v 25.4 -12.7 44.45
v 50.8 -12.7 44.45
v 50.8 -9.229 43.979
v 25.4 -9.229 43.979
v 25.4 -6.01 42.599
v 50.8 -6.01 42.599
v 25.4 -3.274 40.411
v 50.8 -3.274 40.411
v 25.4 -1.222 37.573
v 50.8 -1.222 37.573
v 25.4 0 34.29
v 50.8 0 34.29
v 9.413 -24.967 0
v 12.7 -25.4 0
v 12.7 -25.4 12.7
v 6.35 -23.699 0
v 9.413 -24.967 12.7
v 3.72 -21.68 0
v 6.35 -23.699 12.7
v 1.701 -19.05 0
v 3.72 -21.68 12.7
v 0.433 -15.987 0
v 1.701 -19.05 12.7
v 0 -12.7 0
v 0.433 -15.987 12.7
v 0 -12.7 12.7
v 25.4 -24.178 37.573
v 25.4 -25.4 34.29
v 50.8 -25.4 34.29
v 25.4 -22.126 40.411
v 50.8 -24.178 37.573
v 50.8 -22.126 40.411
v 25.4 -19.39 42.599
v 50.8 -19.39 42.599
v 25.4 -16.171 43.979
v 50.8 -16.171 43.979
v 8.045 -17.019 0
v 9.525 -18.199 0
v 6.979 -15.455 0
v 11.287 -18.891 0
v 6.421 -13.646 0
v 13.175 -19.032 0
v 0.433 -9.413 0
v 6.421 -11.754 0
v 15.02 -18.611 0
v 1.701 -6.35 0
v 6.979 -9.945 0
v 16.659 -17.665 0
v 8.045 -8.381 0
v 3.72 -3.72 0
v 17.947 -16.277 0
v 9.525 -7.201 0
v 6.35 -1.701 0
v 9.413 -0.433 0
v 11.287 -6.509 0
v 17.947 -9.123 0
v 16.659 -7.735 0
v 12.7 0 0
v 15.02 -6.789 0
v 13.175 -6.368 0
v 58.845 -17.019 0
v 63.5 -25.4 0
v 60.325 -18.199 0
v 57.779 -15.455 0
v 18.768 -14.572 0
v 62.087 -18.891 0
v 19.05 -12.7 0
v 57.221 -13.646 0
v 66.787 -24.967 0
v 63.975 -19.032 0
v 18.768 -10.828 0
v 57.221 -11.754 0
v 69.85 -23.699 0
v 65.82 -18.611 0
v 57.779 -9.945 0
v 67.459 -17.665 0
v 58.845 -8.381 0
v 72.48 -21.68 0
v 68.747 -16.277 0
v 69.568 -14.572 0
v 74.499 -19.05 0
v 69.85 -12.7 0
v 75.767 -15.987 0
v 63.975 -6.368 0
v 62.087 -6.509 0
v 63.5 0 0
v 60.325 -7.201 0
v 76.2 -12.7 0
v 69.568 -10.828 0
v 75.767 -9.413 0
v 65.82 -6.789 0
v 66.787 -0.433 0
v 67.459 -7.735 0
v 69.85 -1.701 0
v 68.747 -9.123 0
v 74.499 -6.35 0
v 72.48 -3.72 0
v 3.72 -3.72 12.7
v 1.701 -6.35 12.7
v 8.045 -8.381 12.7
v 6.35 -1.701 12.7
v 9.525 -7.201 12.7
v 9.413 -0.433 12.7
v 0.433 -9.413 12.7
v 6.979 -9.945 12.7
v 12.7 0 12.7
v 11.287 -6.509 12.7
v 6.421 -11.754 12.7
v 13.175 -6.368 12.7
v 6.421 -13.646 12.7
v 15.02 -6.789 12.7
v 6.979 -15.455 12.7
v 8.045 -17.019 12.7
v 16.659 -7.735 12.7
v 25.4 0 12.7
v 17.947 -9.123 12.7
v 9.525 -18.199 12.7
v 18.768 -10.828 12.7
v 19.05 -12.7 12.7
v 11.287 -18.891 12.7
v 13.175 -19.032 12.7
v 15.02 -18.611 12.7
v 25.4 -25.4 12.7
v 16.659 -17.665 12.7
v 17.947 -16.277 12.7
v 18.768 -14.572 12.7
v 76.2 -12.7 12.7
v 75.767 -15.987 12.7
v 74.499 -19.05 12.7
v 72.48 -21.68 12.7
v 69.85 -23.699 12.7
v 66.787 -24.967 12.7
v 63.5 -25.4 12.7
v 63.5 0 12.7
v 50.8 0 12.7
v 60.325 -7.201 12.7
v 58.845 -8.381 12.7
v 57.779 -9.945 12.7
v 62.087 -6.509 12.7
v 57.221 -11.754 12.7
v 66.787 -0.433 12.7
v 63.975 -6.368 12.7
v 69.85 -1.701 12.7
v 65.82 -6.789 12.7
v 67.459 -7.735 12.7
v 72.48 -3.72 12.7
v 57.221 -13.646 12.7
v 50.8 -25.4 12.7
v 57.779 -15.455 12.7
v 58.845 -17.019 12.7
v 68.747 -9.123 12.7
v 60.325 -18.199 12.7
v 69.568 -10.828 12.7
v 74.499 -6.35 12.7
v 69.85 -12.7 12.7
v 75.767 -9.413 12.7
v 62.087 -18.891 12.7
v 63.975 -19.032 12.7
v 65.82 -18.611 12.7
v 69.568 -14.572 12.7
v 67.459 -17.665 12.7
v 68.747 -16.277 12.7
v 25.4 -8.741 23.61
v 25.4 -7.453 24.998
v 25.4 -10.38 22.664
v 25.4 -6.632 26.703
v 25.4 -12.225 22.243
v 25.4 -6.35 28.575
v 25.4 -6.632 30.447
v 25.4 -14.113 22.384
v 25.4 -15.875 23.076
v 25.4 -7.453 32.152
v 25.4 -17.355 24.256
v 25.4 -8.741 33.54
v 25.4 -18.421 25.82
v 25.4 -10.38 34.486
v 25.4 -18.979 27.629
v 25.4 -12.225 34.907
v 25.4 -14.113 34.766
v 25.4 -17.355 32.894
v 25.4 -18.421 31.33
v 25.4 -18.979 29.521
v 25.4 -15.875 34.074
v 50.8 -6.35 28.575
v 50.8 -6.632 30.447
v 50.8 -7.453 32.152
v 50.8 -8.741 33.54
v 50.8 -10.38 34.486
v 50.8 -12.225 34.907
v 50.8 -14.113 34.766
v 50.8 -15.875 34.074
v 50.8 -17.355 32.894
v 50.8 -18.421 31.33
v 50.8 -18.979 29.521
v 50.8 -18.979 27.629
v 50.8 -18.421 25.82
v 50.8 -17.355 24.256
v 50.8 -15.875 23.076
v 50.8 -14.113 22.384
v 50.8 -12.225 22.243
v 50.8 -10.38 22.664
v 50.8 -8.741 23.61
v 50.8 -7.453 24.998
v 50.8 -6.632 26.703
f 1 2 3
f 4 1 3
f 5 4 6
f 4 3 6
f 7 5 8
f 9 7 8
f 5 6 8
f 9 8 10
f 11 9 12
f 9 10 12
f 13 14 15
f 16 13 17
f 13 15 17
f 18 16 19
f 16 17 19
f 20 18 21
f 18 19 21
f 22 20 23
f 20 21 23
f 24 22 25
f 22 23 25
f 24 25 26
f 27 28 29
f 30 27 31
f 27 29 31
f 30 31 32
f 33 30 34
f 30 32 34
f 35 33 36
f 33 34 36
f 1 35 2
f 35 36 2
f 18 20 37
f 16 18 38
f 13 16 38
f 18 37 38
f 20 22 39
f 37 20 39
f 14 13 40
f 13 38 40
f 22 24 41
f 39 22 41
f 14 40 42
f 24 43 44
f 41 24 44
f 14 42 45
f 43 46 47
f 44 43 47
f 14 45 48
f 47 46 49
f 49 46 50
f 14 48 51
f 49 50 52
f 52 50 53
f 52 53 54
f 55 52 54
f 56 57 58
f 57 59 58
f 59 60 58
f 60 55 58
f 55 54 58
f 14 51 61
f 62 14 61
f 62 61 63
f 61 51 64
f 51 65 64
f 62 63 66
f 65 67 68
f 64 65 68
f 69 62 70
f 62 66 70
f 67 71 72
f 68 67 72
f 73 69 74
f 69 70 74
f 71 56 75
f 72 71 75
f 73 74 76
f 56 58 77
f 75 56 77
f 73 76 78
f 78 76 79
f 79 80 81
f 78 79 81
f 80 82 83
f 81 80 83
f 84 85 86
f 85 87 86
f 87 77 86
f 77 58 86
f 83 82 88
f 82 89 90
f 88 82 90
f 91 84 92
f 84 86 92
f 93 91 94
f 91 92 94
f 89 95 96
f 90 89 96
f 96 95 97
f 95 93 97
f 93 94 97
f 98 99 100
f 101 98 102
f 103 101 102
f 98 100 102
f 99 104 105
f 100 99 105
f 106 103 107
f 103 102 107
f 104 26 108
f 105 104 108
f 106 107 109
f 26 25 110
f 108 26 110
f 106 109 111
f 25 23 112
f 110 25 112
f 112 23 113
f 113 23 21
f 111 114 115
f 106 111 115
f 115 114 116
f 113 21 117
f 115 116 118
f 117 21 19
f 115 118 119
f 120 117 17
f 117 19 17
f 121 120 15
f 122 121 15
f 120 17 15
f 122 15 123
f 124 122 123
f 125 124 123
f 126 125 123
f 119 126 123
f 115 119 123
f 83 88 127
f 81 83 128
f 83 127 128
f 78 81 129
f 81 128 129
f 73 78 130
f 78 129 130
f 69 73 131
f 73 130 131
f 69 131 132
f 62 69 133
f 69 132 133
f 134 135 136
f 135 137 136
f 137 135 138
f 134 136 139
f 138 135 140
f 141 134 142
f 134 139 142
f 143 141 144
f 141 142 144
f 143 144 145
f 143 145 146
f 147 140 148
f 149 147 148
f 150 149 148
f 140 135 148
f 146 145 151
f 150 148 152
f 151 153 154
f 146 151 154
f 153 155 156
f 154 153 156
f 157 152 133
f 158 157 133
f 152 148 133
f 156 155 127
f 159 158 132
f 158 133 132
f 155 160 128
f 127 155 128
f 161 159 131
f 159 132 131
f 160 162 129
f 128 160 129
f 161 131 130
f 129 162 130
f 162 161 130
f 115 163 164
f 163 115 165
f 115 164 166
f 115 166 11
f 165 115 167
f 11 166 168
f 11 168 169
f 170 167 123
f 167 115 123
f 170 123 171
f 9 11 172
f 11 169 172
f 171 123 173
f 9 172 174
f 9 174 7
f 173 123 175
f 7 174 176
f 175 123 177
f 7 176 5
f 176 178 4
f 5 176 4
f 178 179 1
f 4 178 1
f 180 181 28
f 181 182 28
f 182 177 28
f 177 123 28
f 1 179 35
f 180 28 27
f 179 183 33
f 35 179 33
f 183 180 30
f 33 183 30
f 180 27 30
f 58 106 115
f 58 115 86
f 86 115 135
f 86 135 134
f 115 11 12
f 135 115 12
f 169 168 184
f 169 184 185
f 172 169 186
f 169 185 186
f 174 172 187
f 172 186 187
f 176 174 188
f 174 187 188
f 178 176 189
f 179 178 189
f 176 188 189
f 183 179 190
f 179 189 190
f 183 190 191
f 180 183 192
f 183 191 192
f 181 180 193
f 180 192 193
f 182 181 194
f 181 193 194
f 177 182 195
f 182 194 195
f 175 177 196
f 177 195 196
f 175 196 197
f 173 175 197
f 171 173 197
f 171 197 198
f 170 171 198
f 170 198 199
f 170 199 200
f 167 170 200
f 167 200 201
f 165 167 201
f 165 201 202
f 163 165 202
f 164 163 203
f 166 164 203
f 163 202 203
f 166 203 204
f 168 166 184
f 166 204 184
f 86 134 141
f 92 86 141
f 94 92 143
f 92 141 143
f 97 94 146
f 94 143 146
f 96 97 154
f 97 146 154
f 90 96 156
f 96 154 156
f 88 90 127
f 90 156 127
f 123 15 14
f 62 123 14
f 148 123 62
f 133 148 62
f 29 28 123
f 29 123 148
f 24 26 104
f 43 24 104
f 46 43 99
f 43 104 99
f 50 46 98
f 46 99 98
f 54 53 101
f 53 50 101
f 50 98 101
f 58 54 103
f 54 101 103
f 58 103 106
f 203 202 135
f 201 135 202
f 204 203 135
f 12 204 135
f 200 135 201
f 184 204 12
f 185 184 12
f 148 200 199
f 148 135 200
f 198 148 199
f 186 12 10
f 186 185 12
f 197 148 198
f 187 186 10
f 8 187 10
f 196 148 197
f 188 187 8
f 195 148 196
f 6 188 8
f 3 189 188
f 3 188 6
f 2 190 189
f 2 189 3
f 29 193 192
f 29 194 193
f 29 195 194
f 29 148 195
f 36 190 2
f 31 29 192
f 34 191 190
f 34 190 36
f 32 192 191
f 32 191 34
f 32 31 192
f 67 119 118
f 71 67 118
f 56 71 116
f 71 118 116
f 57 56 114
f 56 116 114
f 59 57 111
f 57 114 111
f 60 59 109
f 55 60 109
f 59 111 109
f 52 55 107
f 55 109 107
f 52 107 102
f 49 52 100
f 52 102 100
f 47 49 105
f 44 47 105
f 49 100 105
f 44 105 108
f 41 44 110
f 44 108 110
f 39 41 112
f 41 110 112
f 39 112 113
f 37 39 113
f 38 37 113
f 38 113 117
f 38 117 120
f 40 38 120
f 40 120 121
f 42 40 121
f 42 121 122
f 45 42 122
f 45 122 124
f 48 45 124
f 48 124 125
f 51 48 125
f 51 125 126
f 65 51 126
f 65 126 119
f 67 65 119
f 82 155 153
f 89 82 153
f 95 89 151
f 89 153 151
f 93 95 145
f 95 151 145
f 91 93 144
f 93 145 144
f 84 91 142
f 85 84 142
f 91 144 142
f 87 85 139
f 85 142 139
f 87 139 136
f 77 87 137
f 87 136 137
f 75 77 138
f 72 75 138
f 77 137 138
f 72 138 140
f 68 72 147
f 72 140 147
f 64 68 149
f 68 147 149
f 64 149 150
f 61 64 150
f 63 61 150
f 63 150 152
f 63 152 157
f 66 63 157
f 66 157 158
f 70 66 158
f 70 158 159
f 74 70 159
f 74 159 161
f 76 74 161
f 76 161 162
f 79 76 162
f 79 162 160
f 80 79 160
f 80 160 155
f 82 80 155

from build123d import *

# Parameters (mm, degrees)
F0_W     = 76.2
F0_H     = 44.45
F1_DEPTH = 25.4
F2_W     = 25.4
F2_H     = 31.75
F3_DEPTH = 25.4
F4_R     = 6.35
F5_DEPTH = 25.4
F6_R     = 6.35
F7_DEPTH = 25.4
F8_R     = 6.35
F9_DEPTH = 25.4


with BuildPart() as f1:
    # F0 (on Front) → F1 (new body)
    with BuildSketch(Plane.XZ):
        with Locations((38.1, 22.225)):
            Rectangle(F0_W, F0_H)
    extrude(amount=F1_DEPTH)

    # F2 (on face) → F3 (cut)
    with BuildSketch(Plane.XZ.offset(25.4)):
        with Locations((12.7, 28.575)):
            Rectangle(F2_W, F2_H)
        with Locations((63.5, 28.575)):
            Rectangle(F2_W, F2_H)
    extrude(amount=-F3_DEPTH, mode=Mode.SUBTRACT)

    # F4 (on face) → F5 (cut)
    with BuildSketch(Plane.YZ.offset(50.8)):
        with Locations((-12.7, 28.575)):
            Circle(F4_R)
        with BuildLine():
            ThreePointArc((-12.7000002087, 44.45), (-4.5680322999, 41.5974597921), (0, 34.29))
            Line((0, 34.29), (0, 44.45))
            Line((0, 44.45), (-12.7000002087, 44.45))
        make_face()
        with BuildLine():
            ThreePointArc((-25.4, 34.29), (-20.831967863, 41.5974596617), (-12.7000002087, 44.45))
            Line((-12.7000002087, 44.45), (-25.4, 44.45))
            Line((-25.4, 44.45), (-25.4, 34.29))
        make_face()
    extrude(amount=-F5_DEPTH, mode=Mode.SUBTRACT)

    # F6 (on face) → F7 (cut)
    with BuildSketch(Plane.XY.offset(12.7)):
        with Locations((63.5, -12.7)):
            Circle(F6_R)
        with BuildLine():
            ThreePointArc((63.5, 0), (72.4802561211, -3.7197438789), (76.2, -12.7))
            Line((76.2, -12.7), (76.2, 0))
            Line((76.2, 0), (63.5, 0))
        make_face()
        with BuildLine():
            ThreePointArc((76.2, -12.7), (72.4802561211, -21.6802561211), (63.5, -25.4))
            Line((63.5, -25.4), (76.2, -25.4))
            Line((76.2, -25.4), (76.2, -12.7))
        make_face()
    extrude(amount=-F7_DEPTH, mode=Mode.SUBTRACT)

    # F8 (on face) → F9 (cut)
    with BuildSketch(Plane.XY.offset(12.7)):
        with BuildLine():
            ThreePointArc((0, -12.7), (3.7197438789, -3.7197438789), (12.7, 0))
            Line((12.7, 0), (0, 0))
            Line((0, 0), (0, -12.7))
        make_face()
        with Locations((12.7, -12.7)):
            Circle(F8_R)
        with BuildLine():
            ThreePointArc((12.7, -25.4), (3.7197438789, -21.6802561211), (0, -12.7))
            Line((0, -12.7), (0, -25.4))
            Line((0, -25.4), (12.7, -25.4))
        make_face()
    extrude(amount=-F9_DEPTH, mode=Mode.SUBTRACT)


solid = f1.part
